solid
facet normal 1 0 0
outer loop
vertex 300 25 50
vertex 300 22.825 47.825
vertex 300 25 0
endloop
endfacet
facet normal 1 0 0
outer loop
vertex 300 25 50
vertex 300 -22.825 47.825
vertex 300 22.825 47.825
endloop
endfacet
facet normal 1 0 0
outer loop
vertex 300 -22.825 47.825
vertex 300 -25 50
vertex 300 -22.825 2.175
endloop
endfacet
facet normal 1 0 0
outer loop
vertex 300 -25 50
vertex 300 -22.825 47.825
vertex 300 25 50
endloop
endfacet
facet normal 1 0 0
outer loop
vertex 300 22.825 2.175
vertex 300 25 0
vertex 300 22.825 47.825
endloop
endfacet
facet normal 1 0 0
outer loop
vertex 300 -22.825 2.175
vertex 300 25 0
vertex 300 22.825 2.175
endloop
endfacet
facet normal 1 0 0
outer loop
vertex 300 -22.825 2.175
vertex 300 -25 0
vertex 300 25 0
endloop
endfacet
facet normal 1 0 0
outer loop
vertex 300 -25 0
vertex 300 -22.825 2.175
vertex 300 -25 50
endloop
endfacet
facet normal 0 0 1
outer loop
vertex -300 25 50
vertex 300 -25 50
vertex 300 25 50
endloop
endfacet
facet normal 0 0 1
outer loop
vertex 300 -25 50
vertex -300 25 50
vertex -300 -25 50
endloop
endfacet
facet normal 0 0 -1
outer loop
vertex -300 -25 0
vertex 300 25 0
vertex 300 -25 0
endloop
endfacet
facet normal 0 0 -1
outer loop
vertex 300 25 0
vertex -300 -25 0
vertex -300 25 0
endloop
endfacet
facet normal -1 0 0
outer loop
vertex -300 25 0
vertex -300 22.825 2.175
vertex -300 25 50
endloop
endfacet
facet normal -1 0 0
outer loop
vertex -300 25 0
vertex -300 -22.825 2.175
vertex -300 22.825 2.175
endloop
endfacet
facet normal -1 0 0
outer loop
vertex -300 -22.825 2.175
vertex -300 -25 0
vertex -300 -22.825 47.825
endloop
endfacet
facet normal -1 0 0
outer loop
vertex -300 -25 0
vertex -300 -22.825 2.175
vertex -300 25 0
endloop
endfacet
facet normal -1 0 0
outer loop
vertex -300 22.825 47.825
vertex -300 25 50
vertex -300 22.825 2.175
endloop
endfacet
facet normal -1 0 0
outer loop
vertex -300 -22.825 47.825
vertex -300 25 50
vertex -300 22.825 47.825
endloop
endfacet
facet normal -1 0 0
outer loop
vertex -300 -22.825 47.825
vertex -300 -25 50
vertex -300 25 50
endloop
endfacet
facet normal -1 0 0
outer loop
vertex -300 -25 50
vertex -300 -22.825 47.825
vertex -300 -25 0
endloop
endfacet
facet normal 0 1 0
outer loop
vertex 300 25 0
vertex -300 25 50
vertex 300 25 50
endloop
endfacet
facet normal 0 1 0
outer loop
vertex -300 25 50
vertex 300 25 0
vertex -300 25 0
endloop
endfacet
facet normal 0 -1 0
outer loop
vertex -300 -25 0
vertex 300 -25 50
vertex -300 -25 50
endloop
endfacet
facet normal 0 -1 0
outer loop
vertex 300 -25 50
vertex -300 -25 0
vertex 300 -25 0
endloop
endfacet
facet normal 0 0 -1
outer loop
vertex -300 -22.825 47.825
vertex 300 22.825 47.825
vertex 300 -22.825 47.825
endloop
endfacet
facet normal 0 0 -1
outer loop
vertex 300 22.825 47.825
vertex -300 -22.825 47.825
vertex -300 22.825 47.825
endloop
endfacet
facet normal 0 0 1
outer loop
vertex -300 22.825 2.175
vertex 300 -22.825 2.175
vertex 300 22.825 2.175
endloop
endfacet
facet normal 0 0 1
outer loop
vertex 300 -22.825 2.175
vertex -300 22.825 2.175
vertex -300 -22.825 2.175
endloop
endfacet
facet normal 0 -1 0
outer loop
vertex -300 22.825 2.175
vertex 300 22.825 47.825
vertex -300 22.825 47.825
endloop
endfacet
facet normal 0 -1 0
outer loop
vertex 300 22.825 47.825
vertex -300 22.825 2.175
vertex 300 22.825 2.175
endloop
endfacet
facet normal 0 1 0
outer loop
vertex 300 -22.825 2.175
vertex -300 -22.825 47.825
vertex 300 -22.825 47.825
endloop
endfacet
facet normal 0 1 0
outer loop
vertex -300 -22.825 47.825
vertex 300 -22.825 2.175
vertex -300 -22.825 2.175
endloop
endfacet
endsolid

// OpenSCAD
// Generated mass-constrained structural surrogate, not OEM geometry.
// No interface coordinates, tolerances, fitment or manufacturing credit.
// The uniform square tube is one mathematical witness compatible with envelope and mass.

$fn = 48;
length_mm = 600.000000;
outer_mm = 50.000000;
wall_mm = 2.175319724;
inner_mm = outer_mm - 2 * wall_mm;

difference() {
    translate([-length_mm / 2, -outer_mm / 2, 0])
        cube([length_mm, outer_mm, outer_mm], center = false);
    translate([-length_mm / 2 - 1, -inner_mm / 2, wall_mm])
        cube([length_mm + 2, inner_mm, inner_mm], center = false);
}
